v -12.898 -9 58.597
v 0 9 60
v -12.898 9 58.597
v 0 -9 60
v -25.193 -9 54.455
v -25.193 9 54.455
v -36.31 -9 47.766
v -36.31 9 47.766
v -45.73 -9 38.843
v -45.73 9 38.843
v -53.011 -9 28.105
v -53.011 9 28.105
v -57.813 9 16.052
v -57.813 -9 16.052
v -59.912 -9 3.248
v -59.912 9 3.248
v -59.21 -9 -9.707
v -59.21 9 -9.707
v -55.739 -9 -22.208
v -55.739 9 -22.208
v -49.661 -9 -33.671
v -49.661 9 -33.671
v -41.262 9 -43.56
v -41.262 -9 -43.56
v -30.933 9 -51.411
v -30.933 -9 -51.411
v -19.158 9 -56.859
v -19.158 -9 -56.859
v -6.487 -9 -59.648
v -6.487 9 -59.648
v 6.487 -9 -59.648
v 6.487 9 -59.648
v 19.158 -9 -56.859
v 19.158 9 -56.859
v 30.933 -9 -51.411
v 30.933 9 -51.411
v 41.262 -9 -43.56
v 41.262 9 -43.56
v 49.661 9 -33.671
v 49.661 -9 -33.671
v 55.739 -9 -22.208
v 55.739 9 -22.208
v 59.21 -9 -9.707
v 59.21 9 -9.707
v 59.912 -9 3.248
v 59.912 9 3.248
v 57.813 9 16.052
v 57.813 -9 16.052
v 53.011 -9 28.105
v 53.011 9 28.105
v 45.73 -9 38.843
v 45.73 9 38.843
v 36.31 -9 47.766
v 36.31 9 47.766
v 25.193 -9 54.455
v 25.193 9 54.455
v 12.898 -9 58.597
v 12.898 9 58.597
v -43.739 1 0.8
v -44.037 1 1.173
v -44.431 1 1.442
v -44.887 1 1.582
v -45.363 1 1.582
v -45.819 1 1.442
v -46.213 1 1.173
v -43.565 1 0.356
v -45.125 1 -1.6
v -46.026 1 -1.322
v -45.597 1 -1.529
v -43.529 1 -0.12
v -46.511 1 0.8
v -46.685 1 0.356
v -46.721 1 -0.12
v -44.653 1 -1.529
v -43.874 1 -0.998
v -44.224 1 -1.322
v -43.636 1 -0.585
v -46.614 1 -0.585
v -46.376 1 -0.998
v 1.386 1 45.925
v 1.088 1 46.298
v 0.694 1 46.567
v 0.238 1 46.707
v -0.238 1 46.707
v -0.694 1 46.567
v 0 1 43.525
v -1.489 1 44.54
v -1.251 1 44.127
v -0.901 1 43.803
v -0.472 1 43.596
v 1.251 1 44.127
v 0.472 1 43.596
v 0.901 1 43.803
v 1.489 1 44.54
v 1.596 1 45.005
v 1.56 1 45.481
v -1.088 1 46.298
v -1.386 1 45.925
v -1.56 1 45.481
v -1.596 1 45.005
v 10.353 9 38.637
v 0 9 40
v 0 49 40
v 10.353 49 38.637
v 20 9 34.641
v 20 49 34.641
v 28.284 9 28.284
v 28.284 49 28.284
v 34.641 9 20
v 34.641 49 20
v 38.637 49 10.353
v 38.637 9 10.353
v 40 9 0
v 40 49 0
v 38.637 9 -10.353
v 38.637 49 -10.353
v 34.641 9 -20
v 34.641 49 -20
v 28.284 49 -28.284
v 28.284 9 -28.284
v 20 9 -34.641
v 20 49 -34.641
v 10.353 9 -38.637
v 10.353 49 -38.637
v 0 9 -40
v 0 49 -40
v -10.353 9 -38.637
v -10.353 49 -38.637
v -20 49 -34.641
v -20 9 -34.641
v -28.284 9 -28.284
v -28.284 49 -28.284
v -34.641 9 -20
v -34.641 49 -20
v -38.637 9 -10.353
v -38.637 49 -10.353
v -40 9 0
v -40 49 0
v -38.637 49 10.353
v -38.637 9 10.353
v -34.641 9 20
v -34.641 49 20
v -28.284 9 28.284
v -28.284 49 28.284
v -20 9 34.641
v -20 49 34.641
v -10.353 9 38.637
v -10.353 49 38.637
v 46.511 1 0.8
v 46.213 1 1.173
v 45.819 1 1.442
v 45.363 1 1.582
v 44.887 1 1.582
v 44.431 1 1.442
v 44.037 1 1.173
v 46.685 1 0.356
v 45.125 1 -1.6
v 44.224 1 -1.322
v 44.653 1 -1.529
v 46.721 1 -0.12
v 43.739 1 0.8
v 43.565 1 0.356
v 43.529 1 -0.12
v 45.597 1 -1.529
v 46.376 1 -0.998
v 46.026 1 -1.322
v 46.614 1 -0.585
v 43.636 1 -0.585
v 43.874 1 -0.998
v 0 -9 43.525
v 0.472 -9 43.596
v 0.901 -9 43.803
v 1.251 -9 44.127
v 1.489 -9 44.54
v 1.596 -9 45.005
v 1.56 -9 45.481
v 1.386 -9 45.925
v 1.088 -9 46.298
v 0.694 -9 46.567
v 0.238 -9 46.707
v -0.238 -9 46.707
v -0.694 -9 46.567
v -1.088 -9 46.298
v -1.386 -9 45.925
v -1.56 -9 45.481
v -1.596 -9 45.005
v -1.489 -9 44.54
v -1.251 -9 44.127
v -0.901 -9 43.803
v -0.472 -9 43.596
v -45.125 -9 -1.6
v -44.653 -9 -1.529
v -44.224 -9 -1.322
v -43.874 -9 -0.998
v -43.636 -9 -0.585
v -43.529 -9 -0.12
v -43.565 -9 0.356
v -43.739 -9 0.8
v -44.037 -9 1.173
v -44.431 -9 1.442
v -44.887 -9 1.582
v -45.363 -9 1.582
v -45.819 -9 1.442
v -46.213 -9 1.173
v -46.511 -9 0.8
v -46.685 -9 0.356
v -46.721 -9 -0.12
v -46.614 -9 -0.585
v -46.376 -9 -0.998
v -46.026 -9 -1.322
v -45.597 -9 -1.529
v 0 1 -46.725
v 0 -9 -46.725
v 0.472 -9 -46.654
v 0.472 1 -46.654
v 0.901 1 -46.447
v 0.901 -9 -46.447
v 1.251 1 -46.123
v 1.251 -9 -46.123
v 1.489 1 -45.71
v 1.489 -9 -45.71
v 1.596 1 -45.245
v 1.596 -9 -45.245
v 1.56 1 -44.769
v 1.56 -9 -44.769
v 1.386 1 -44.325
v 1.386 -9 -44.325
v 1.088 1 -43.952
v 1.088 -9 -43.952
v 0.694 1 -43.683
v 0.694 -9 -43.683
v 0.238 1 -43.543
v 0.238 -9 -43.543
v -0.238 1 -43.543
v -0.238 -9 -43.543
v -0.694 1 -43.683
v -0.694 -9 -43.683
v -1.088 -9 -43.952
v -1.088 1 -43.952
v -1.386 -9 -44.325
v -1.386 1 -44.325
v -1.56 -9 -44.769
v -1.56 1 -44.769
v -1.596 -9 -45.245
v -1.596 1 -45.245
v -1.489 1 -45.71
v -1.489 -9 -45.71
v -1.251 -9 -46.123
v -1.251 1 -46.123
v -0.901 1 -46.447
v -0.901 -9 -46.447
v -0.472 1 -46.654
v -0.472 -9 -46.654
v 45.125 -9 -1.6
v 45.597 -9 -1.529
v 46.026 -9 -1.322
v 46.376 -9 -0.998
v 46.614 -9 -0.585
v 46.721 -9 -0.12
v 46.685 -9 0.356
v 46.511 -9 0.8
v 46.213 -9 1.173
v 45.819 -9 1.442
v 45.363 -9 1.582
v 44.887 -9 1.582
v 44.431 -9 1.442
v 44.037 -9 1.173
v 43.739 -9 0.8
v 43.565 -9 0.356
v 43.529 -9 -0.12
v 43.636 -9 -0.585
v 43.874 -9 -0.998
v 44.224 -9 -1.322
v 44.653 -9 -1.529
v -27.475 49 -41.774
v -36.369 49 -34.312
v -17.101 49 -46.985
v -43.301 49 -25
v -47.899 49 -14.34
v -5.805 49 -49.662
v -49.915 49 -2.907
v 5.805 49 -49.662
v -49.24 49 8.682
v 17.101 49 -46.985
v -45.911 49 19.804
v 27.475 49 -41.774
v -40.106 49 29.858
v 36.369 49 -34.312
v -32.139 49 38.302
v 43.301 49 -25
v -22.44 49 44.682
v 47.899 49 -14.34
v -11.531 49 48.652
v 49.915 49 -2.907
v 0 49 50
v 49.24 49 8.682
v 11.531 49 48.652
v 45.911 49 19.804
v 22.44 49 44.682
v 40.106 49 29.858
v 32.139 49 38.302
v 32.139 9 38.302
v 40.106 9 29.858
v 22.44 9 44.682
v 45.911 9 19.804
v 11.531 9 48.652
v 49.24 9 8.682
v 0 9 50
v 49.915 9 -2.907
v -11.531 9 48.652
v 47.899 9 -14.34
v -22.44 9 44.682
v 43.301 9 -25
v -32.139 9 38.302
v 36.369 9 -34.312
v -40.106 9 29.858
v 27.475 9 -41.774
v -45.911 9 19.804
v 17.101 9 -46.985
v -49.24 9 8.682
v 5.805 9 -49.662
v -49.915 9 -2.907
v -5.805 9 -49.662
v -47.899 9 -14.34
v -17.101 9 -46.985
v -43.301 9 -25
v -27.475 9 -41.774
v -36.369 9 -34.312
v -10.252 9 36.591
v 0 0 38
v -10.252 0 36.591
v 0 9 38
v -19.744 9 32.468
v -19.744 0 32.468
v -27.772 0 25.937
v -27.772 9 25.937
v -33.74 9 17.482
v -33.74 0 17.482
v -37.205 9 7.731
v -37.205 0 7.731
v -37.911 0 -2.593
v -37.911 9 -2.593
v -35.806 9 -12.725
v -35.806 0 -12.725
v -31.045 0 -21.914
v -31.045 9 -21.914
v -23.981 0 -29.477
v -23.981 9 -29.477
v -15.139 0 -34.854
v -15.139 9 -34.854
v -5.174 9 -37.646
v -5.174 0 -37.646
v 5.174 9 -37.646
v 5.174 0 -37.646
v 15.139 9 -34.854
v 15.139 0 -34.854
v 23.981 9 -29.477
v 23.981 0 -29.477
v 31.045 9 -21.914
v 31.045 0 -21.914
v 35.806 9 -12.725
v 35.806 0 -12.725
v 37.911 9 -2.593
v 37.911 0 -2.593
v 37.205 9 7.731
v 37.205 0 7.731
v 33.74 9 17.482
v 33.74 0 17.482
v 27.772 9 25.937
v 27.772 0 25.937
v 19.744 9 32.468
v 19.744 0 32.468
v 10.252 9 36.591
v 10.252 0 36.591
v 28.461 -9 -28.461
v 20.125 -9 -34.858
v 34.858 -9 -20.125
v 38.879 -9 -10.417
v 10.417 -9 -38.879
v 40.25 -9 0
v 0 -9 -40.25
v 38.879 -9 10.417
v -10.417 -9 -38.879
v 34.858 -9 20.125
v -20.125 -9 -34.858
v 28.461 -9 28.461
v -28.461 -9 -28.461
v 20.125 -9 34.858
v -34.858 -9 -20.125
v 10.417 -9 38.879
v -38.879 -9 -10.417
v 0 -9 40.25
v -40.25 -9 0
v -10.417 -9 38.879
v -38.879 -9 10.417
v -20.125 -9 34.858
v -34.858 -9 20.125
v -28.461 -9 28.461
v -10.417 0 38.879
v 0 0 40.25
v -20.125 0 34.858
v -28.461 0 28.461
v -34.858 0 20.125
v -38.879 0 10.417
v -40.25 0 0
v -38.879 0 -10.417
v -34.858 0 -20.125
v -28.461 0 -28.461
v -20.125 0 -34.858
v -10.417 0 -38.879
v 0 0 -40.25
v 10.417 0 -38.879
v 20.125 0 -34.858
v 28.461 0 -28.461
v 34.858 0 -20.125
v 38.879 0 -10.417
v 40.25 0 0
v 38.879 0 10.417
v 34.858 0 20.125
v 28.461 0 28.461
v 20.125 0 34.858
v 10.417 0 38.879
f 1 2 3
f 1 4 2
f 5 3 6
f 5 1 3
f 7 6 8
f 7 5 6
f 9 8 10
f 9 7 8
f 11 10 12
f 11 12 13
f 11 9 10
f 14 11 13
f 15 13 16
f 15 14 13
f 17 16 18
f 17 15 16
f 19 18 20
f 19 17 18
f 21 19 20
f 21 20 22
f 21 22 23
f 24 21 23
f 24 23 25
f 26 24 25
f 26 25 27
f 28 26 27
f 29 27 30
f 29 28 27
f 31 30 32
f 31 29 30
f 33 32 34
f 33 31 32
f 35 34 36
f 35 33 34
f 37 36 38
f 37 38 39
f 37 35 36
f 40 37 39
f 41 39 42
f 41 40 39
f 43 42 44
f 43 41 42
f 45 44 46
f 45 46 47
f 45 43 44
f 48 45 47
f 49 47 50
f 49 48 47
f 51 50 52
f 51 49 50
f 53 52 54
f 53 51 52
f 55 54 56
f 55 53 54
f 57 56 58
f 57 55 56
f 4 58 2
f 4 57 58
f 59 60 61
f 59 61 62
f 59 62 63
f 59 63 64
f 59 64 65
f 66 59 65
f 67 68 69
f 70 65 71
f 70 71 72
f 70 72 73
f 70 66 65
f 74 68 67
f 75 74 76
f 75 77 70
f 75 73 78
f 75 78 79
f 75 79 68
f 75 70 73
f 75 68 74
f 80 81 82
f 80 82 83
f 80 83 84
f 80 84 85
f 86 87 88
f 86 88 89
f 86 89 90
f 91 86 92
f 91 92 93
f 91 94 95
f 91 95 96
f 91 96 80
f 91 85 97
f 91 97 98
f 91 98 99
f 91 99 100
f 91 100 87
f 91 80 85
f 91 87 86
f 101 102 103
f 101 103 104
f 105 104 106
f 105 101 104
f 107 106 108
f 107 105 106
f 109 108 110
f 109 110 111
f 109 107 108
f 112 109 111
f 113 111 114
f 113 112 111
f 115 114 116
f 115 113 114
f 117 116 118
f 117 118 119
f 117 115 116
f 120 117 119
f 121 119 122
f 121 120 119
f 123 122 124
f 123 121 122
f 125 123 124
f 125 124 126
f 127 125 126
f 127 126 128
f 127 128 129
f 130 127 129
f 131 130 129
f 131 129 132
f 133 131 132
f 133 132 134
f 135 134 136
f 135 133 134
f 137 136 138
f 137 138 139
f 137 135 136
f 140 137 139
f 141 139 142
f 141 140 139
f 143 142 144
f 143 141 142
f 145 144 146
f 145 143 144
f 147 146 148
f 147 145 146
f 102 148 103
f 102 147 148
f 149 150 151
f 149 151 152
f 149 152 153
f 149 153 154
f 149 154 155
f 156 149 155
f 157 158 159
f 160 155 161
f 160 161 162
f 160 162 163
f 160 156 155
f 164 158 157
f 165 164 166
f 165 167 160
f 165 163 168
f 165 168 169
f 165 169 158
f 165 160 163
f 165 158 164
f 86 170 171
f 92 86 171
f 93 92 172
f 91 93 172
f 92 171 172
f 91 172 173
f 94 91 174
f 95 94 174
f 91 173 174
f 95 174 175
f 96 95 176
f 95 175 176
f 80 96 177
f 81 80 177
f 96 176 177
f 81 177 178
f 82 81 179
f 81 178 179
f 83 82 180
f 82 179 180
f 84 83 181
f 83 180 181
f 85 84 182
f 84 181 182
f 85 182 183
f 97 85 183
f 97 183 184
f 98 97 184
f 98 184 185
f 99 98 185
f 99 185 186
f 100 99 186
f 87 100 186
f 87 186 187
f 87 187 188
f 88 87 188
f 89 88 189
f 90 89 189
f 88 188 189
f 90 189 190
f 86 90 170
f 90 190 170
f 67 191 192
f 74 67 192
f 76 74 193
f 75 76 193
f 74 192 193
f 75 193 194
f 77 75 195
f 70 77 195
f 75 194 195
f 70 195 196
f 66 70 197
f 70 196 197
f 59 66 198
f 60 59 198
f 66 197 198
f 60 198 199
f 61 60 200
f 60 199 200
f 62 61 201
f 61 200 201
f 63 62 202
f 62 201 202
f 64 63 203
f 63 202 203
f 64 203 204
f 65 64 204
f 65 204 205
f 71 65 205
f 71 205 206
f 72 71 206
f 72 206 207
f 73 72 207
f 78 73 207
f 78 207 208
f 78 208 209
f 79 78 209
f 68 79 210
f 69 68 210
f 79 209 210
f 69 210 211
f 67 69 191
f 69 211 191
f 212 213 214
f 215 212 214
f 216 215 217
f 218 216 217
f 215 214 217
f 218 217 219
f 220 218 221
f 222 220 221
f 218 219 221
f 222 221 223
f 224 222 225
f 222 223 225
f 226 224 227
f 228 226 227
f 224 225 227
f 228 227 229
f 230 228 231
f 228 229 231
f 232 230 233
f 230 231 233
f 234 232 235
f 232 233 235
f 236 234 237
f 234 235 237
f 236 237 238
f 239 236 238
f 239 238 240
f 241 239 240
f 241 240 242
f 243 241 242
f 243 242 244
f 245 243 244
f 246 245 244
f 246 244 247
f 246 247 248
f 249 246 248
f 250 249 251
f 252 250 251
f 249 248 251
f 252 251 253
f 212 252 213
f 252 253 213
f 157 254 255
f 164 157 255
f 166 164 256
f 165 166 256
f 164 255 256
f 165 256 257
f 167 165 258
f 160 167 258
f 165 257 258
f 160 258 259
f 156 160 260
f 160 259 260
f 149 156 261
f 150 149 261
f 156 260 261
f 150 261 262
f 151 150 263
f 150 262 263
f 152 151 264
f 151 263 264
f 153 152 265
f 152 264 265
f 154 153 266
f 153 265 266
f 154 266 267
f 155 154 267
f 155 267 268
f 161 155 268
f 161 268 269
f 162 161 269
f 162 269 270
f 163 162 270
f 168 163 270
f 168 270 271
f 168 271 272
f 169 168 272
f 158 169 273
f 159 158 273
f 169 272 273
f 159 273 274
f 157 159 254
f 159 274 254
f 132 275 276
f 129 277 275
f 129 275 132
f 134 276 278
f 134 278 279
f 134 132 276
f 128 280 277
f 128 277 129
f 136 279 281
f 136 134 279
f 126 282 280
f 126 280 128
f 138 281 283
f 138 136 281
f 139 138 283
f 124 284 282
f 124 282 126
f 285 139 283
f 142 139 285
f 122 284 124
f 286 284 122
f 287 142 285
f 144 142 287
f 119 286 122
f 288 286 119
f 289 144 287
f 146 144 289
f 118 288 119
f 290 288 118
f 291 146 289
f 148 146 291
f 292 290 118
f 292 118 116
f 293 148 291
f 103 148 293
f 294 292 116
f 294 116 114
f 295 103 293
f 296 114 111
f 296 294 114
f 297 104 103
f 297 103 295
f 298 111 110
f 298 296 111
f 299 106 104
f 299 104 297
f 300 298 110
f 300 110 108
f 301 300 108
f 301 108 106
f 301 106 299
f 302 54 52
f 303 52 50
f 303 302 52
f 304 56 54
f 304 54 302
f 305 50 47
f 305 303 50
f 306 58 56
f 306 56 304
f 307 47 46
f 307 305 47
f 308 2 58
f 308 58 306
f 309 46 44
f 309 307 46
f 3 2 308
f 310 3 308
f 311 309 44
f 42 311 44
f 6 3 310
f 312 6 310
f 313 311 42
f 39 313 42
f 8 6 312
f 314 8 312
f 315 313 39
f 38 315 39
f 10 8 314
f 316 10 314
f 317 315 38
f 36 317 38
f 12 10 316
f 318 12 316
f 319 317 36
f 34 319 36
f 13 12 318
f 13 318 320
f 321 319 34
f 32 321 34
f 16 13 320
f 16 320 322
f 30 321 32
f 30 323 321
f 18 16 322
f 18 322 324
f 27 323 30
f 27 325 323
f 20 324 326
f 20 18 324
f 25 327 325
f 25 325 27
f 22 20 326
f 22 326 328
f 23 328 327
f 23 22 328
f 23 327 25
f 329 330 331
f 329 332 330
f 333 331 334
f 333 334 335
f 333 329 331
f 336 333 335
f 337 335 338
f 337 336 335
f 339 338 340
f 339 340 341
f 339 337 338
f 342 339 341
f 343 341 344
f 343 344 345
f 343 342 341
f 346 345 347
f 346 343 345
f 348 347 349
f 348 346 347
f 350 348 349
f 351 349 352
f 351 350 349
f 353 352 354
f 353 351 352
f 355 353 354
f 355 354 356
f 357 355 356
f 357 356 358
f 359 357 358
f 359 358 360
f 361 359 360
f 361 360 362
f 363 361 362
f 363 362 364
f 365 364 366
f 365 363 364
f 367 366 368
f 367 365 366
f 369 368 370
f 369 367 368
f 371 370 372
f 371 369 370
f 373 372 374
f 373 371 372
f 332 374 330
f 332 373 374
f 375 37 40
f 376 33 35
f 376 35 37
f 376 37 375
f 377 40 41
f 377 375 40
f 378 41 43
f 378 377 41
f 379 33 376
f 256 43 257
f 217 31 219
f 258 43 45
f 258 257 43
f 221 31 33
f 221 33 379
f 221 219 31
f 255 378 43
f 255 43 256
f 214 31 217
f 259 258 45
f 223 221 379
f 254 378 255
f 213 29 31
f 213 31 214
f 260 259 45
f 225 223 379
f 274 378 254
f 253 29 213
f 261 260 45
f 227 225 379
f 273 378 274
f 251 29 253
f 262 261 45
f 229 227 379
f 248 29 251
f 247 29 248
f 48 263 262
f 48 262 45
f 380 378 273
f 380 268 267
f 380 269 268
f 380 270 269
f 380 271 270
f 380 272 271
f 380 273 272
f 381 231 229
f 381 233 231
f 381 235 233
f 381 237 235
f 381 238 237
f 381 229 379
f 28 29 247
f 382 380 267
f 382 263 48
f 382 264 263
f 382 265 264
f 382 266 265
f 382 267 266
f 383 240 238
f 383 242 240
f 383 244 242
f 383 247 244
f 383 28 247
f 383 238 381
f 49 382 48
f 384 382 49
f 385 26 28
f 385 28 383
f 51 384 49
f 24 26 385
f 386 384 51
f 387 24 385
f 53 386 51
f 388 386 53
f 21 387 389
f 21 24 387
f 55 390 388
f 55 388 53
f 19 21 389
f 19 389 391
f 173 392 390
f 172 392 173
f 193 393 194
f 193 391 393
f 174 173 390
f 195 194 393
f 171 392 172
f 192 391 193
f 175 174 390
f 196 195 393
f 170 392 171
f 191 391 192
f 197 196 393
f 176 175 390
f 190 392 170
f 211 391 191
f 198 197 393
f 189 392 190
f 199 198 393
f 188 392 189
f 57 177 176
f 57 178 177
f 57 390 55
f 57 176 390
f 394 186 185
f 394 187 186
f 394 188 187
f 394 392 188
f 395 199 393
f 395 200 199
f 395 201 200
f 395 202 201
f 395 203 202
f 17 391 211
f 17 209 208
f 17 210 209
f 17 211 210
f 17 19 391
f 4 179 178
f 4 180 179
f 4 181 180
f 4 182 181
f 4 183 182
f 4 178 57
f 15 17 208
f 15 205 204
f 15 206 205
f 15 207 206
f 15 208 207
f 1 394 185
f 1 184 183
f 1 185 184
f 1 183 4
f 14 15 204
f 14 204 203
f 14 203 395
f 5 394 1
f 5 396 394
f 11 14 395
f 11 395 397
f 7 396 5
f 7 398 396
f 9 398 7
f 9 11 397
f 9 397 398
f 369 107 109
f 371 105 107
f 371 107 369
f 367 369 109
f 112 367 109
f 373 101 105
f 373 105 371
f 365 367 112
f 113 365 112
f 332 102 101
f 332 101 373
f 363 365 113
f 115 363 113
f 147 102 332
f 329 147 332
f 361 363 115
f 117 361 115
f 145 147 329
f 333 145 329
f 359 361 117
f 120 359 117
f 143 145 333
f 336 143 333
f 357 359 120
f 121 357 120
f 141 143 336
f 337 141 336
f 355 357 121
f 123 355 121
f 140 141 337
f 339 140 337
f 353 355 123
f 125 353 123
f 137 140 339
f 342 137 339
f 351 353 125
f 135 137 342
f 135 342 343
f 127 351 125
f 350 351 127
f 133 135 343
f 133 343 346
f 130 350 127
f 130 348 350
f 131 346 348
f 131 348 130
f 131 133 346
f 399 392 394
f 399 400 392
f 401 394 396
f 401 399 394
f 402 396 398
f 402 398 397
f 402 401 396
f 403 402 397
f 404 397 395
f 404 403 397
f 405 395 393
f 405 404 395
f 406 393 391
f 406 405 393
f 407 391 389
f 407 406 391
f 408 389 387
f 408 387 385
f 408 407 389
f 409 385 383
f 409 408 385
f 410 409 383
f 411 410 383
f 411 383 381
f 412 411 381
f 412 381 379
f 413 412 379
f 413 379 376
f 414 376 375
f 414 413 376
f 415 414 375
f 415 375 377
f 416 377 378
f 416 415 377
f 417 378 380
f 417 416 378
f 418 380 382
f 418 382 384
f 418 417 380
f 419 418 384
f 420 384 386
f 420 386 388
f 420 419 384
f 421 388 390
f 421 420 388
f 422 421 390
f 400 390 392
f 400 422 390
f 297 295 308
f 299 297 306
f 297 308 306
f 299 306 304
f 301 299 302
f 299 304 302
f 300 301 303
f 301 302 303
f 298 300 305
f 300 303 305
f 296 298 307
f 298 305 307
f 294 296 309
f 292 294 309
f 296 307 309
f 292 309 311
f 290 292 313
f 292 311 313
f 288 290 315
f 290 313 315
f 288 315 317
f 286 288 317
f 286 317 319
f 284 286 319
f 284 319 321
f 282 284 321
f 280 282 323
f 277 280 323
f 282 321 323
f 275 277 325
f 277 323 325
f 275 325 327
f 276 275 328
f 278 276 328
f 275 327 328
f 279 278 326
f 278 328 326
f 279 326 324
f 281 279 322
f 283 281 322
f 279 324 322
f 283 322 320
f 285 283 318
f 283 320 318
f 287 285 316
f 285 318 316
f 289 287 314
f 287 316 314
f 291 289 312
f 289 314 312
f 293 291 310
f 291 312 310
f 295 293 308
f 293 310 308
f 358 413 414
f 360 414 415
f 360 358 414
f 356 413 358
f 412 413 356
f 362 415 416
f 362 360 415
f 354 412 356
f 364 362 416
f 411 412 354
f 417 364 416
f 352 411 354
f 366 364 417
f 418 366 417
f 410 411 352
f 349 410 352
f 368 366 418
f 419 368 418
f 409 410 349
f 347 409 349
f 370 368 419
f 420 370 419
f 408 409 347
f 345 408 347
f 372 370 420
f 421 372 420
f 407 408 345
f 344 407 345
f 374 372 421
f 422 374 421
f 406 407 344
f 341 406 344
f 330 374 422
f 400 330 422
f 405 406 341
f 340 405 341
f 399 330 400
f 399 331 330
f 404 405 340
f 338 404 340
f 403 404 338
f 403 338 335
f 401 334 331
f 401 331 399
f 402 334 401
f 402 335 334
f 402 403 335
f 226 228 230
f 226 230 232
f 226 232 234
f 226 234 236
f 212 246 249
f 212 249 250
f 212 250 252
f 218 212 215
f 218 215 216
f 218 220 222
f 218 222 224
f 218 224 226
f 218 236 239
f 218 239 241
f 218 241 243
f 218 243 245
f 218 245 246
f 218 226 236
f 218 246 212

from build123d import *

# Parameters (mm, degrees)
SKETCH3_R           = 1.6
CUT_EXTRUDE1_DEPTH  = 10
SKETCH4_R           = 50
SKETCH4_R_2         = 40
BOSS_EXTRUDE1_DEPTH = 40


with BuildPart() as part:
    # Sketch1 → Revolve1 (revolve)
    with BuildSketch(Plane.XY, mode=Mode.PRIVATE) as revolve1_sk:
        Polygon((38, 0), (38, 9), (60, 9), (60, -9), (40.25, -9), (40.25, 0), align=None)
    revolve(revolve1_sk.sketch.rotate(Axis((0, 83.520836207, 0), (0, -1, 0)), 90), axis=Axis((0, 83.520836207, 0), (0, -1, 0)))

    # Sketch3 → Cut-Extrude1 (cut)
    with BuildSketch(Plane.XZ.offset(9)):
        with Locations(Location((0, 45.125, 0), (0, 0, 270))):
            Circle(SKETCH3_R)
        with Locations(Location((45.125, 0, 0), (0, 0, 270))):
            Circle(SKETCH3_R)
        with Locations(Location((0, -45.125, 0), (0, 0, 270))):
            Circle(SKETCH3_R)
        with Locations(Location((-45.125, 0, 0), (0, 0, 270))):
            Circle(SKETCH3_R)
    extrude(amount=-CUT_EXTRUDE1_DEPTH, mode=Mode.SUBTRACT)

    # Sketch4 → Boss-Extrude1 (add)
    with BuildSketch(Plane(origin=(0, 9, 0), x_dir=(1, 0, 0), z_dir=(0, 1, 0))):
        with Locations(Location((0, 0, 0), (0, 0, 270))):
            Circle(SKETCH4_R)
        with Locations(Location((0, 0, 0), (0, 0, 270))):
            Circle(SKETCH4_R_2, mode=Mode.SUBTRACT)
    extrude(amount=BOSS_EXTRUDE1_DEPTH)


solid = part.part
